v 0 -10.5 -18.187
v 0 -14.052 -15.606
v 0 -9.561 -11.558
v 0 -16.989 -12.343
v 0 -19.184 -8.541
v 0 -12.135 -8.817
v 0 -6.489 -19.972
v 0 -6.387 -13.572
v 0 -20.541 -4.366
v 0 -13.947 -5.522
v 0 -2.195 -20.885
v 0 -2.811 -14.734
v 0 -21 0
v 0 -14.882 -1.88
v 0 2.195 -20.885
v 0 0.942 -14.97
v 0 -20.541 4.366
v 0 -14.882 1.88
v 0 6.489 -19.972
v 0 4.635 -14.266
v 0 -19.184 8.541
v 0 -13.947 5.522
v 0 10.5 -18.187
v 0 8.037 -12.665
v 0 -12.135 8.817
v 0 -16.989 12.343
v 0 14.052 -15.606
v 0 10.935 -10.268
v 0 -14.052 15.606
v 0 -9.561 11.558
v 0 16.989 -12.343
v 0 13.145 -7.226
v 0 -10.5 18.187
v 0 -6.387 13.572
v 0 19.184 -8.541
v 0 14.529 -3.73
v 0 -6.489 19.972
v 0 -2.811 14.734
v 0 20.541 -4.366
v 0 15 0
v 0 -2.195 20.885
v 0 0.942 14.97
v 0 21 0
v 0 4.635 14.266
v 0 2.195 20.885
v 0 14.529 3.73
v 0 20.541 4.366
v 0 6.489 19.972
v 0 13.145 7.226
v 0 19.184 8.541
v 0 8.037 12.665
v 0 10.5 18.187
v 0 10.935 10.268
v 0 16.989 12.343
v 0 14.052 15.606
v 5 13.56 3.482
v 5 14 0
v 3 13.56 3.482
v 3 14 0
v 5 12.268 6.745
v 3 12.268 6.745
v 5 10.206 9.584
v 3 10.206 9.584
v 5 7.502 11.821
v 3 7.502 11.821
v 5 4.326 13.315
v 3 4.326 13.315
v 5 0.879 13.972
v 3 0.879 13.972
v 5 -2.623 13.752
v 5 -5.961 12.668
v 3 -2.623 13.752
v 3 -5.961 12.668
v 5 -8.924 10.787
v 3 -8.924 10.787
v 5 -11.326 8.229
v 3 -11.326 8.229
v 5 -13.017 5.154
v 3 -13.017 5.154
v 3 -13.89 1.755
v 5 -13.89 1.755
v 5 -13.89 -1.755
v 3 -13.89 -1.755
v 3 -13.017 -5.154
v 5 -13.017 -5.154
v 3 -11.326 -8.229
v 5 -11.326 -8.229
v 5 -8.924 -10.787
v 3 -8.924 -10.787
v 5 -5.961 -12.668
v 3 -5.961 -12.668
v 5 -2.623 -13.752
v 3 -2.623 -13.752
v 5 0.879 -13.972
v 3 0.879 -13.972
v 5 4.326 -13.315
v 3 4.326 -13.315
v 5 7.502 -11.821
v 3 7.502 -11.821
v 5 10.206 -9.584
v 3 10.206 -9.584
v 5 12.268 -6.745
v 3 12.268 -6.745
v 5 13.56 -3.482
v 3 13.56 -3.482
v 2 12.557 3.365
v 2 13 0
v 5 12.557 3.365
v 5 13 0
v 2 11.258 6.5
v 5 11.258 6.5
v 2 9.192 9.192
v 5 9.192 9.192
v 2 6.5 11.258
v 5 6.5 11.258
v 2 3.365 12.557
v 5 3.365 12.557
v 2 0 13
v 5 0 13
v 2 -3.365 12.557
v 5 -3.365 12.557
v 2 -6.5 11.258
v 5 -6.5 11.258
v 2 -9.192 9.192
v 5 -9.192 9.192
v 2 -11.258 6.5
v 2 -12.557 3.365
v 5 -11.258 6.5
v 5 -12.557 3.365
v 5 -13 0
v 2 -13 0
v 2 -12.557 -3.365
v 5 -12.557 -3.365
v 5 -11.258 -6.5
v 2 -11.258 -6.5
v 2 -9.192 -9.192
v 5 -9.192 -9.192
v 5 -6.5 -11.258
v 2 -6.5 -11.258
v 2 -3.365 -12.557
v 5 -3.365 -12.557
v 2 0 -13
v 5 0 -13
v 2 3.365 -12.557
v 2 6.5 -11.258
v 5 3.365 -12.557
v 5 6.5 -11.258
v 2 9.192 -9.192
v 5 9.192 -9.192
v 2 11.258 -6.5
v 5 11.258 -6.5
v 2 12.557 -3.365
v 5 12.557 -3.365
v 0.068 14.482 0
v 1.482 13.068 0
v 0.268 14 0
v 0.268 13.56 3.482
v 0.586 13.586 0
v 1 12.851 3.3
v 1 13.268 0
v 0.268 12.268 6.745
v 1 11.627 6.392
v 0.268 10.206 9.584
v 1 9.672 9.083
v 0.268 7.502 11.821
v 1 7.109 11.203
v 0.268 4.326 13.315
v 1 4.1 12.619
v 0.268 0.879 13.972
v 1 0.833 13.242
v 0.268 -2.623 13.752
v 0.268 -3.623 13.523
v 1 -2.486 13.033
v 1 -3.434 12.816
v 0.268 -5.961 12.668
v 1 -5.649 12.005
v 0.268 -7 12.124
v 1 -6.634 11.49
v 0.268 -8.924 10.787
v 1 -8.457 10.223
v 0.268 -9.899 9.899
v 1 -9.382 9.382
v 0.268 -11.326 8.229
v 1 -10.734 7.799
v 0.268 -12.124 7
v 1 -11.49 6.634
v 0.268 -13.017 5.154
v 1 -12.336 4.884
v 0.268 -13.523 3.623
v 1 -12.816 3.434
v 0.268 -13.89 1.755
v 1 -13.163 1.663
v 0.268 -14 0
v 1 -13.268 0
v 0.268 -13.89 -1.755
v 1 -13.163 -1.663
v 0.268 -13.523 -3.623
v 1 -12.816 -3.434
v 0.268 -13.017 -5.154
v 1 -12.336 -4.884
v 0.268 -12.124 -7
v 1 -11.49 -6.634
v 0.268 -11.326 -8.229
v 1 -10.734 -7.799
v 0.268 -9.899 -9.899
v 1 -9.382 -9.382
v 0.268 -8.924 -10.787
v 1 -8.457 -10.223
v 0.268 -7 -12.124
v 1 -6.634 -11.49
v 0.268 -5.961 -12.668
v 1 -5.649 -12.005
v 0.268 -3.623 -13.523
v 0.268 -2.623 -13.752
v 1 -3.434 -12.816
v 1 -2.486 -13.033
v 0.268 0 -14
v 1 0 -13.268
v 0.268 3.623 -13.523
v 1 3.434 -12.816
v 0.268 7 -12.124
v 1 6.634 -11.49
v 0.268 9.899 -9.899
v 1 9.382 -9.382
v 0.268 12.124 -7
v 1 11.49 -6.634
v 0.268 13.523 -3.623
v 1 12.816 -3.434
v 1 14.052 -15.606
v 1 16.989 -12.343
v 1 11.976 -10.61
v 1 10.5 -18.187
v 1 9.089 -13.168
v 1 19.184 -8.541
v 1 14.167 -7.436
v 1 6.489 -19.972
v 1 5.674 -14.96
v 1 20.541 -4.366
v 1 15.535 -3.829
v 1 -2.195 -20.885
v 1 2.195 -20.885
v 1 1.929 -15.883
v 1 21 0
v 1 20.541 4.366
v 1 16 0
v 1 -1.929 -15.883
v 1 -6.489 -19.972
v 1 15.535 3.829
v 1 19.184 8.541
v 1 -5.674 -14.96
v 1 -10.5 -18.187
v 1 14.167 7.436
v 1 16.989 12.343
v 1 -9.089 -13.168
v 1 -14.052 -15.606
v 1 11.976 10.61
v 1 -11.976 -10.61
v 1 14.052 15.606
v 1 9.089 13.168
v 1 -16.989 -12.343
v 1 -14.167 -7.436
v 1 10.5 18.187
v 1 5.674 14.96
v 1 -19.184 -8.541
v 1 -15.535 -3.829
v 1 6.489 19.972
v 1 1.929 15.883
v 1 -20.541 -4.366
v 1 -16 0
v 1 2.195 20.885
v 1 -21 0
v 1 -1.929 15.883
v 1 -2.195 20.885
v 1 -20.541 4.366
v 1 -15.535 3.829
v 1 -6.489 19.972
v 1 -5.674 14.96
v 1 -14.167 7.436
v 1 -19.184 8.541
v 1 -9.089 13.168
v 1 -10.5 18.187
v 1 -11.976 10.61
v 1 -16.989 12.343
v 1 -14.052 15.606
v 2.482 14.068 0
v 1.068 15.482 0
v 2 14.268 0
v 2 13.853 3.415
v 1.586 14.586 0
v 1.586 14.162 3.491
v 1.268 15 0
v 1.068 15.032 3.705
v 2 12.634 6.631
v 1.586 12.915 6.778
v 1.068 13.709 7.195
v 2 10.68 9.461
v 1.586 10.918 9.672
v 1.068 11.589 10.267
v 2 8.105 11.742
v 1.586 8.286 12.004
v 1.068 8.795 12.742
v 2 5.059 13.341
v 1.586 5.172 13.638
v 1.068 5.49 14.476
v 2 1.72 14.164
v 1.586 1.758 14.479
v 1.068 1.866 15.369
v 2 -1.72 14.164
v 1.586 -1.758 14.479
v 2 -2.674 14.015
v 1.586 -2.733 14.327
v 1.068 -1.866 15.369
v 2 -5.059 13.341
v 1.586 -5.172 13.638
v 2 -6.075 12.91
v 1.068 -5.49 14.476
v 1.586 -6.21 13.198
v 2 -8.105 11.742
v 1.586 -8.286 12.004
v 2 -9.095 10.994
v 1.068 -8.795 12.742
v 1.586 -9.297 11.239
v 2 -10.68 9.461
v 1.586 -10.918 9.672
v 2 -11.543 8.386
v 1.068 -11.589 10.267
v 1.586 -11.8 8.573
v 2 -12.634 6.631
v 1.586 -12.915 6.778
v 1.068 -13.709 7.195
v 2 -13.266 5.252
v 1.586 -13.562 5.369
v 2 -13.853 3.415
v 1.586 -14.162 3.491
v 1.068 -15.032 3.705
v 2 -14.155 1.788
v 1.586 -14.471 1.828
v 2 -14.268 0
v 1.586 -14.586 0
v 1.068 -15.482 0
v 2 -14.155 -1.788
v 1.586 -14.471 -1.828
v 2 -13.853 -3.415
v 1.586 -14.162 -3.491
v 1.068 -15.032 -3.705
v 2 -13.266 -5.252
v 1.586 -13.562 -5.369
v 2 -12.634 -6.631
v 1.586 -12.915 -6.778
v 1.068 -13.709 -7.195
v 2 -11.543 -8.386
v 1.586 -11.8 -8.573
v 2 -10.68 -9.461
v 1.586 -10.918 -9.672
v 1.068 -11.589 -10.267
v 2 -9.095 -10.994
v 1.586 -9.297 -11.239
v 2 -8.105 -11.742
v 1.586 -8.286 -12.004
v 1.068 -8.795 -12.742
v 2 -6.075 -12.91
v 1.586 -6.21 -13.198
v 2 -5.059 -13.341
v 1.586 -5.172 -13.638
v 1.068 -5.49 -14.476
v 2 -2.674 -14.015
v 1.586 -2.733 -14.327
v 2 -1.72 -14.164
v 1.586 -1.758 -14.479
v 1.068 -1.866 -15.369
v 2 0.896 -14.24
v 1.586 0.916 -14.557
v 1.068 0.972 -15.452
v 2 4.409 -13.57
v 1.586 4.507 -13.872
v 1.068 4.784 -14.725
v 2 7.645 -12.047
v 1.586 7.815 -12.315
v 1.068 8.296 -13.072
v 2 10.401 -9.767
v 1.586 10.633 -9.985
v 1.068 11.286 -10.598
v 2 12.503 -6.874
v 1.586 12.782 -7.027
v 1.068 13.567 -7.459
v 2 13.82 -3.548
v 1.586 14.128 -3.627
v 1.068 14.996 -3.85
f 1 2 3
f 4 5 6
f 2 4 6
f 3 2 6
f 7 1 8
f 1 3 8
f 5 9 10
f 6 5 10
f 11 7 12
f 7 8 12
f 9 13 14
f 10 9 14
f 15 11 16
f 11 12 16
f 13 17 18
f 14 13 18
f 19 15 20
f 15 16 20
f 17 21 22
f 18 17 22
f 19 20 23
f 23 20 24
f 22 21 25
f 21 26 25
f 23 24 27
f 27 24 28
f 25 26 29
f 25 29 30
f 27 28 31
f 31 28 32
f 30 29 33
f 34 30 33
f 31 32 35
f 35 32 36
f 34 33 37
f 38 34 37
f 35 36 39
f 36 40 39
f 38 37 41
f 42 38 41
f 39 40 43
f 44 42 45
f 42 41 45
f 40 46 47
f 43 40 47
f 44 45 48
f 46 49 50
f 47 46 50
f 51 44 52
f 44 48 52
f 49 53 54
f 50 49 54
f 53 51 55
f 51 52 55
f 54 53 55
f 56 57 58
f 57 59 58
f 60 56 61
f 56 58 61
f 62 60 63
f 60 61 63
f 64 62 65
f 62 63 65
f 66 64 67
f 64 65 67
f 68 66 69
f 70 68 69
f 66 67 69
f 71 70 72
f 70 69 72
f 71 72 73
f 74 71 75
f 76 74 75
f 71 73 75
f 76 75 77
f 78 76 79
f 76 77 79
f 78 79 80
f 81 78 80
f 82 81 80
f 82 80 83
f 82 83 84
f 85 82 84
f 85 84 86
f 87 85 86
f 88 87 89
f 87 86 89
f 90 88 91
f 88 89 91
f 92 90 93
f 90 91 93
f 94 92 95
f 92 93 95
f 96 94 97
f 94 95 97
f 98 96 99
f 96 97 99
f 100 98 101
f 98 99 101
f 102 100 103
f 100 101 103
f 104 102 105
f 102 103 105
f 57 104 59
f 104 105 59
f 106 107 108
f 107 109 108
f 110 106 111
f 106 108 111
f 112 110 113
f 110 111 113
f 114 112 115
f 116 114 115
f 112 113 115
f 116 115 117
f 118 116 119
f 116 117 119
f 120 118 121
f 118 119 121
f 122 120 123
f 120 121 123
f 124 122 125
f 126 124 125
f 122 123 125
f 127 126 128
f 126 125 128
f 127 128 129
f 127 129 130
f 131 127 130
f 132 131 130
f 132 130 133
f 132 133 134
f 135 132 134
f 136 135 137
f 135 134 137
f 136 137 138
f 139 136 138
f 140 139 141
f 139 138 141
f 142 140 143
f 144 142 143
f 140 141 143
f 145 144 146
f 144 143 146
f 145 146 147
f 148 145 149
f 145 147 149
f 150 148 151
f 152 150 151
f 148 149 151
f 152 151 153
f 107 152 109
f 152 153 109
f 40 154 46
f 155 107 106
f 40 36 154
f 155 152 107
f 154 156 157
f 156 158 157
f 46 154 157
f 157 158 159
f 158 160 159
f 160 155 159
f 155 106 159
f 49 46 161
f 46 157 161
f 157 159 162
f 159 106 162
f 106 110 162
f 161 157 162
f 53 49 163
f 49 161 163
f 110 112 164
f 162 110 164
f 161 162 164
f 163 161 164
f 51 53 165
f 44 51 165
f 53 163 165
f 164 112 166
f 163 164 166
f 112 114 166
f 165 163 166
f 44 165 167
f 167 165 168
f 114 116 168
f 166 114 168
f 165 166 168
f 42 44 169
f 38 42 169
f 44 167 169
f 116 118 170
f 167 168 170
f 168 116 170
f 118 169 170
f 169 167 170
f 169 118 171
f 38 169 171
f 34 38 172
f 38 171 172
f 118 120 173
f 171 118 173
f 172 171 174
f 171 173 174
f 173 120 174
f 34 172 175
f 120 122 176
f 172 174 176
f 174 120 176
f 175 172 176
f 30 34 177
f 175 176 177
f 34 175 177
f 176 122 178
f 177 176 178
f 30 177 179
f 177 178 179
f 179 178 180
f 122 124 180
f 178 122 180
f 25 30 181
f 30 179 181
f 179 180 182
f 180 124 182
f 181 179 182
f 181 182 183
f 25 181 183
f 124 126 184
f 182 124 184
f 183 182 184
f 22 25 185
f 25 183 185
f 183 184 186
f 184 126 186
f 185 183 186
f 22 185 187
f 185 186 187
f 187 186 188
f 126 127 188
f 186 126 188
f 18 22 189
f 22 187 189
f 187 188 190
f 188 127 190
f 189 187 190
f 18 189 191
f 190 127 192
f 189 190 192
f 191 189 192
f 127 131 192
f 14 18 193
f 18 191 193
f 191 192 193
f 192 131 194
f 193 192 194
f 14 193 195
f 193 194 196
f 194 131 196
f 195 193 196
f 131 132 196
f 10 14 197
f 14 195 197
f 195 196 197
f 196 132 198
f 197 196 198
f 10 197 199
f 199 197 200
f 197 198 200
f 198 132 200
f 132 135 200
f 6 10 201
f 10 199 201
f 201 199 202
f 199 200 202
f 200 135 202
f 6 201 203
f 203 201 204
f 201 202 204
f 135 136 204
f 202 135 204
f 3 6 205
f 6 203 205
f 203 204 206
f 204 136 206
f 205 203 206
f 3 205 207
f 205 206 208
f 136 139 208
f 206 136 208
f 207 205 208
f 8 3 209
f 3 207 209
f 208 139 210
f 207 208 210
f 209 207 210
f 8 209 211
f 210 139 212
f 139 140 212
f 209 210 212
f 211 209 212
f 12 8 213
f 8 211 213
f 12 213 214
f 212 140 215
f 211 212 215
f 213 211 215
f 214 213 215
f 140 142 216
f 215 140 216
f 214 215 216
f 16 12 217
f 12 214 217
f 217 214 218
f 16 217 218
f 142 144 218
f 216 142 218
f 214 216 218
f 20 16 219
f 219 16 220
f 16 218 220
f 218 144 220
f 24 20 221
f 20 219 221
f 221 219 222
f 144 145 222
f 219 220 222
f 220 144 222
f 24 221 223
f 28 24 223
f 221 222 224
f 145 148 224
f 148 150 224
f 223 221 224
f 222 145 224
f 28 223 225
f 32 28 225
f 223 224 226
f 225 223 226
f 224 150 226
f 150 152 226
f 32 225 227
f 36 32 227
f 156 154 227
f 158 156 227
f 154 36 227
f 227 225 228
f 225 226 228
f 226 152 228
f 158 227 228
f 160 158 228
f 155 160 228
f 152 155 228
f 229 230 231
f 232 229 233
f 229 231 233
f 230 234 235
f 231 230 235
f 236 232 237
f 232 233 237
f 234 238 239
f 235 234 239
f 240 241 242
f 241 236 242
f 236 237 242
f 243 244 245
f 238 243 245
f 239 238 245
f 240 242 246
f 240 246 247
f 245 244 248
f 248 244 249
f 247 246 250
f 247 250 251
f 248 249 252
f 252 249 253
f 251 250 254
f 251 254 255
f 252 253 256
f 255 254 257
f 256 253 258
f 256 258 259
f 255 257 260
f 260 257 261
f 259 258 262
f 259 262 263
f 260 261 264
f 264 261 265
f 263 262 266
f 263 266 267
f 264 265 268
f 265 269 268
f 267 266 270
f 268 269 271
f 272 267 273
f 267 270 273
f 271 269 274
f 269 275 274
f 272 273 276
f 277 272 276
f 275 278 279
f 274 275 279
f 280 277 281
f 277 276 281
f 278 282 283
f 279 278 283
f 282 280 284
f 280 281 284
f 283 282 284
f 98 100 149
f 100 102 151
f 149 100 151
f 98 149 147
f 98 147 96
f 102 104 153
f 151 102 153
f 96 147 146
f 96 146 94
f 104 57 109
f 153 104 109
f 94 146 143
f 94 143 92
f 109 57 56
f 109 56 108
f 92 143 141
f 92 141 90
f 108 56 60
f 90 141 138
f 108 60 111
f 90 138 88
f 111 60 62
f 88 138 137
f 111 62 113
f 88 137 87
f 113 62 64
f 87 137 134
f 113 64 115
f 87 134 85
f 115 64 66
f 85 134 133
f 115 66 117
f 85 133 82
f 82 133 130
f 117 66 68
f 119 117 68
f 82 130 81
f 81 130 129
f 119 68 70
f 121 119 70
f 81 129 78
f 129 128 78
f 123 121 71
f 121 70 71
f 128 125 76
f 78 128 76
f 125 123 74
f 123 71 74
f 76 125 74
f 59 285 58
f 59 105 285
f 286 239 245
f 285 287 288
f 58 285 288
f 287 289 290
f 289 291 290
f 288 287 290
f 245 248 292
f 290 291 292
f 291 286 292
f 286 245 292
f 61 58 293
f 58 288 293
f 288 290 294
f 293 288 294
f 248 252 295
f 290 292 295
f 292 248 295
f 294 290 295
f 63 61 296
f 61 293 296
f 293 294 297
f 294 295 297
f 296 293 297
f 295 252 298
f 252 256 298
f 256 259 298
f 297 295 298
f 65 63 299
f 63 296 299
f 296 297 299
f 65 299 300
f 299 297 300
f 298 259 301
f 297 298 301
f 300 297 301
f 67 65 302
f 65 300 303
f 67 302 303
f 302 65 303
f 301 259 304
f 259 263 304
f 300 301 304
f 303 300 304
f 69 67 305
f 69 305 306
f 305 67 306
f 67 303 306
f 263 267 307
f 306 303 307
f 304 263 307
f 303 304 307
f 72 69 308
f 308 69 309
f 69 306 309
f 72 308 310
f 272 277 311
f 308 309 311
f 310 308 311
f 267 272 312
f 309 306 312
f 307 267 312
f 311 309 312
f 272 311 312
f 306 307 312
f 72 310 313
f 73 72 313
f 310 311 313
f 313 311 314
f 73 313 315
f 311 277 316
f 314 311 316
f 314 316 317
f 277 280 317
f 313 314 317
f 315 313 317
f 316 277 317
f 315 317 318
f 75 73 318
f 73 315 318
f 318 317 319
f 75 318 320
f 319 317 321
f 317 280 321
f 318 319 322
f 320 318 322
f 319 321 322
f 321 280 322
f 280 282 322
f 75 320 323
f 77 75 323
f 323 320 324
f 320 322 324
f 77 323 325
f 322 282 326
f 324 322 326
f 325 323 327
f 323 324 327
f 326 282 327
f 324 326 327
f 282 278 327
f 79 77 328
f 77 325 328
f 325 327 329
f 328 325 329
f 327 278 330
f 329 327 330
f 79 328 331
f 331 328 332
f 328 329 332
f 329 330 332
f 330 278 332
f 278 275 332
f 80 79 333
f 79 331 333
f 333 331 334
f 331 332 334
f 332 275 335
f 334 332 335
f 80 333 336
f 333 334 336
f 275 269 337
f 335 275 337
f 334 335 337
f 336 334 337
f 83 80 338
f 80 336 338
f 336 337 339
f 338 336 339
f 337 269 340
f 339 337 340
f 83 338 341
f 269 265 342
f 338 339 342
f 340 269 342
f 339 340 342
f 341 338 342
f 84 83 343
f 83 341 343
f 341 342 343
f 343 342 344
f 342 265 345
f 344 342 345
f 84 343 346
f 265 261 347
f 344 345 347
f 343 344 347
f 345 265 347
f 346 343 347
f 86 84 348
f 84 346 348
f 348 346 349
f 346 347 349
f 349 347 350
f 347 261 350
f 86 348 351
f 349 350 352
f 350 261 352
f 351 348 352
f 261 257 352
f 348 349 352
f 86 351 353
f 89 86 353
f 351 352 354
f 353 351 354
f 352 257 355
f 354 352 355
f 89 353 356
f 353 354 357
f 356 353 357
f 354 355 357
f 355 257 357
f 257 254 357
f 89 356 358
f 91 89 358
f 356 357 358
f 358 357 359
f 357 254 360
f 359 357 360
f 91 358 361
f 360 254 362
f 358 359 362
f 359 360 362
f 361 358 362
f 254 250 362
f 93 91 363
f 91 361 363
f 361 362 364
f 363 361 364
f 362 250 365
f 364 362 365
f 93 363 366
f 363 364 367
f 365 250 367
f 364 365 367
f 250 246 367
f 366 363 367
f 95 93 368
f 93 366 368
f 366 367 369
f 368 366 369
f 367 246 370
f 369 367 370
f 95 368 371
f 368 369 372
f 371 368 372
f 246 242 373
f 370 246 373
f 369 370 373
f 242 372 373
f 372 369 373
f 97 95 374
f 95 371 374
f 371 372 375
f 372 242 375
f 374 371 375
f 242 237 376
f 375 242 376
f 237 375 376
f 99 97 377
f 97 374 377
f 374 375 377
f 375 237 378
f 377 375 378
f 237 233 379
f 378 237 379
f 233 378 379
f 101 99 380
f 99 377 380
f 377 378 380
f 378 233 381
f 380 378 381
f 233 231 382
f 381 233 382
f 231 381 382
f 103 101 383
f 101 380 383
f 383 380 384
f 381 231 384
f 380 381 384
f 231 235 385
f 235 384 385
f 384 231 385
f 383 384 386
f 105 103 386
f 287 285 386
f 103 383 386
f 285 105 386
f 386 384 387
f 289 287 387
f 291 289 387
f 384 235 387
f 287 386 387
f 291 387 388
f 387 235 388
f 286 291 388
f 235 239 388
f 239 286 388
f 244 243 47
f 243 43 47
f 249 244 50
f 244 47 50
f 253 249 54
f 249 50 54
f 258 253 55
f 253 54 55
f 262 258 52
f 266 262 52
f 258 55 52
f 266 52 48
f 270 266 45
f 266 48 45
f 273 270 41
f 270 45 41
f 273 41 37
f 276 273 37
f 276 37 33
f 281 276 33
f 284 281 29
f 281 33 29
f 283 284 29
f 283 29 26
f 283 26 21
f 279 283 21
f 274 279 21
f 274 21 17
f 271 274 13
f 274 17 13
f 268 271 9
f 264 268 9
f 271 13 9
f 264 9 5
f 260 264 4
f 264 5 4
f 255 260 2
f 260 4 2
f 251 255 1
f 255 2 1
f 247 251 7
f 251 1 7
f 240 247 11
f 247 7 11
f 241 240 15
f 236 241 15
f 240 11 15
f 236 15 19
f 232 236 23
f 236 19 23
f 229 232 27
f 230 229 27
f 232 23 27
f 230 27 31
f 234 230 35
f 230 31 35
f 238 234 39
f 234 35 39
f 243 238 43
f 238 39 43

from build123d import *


with BuildPart() as part:
    # Эскиз2 → Повернуть1 (revolve)
    with BuildSketch(Plane.XY):
        with BuildLine():
            Line((0, 21), (0, 15))
            ThreePointArc((0, 15), (0.585786438, 13.585786438), (2, 13))
            Line((2, 13), (5, 13))
            Line((5, 13), (5, 14))
            Line((5, 14), (3, 14))
            ThreePointArc((3, 14), (1.585786438, 14.585786438), (1, 16))
            Line((1, 16), (1, 21))
            Line((1, 21), (0, 21))
        make_face()
    revolve(axis=Axis((0, 0, 0), (1, 0, 0)))


solid = part.part
